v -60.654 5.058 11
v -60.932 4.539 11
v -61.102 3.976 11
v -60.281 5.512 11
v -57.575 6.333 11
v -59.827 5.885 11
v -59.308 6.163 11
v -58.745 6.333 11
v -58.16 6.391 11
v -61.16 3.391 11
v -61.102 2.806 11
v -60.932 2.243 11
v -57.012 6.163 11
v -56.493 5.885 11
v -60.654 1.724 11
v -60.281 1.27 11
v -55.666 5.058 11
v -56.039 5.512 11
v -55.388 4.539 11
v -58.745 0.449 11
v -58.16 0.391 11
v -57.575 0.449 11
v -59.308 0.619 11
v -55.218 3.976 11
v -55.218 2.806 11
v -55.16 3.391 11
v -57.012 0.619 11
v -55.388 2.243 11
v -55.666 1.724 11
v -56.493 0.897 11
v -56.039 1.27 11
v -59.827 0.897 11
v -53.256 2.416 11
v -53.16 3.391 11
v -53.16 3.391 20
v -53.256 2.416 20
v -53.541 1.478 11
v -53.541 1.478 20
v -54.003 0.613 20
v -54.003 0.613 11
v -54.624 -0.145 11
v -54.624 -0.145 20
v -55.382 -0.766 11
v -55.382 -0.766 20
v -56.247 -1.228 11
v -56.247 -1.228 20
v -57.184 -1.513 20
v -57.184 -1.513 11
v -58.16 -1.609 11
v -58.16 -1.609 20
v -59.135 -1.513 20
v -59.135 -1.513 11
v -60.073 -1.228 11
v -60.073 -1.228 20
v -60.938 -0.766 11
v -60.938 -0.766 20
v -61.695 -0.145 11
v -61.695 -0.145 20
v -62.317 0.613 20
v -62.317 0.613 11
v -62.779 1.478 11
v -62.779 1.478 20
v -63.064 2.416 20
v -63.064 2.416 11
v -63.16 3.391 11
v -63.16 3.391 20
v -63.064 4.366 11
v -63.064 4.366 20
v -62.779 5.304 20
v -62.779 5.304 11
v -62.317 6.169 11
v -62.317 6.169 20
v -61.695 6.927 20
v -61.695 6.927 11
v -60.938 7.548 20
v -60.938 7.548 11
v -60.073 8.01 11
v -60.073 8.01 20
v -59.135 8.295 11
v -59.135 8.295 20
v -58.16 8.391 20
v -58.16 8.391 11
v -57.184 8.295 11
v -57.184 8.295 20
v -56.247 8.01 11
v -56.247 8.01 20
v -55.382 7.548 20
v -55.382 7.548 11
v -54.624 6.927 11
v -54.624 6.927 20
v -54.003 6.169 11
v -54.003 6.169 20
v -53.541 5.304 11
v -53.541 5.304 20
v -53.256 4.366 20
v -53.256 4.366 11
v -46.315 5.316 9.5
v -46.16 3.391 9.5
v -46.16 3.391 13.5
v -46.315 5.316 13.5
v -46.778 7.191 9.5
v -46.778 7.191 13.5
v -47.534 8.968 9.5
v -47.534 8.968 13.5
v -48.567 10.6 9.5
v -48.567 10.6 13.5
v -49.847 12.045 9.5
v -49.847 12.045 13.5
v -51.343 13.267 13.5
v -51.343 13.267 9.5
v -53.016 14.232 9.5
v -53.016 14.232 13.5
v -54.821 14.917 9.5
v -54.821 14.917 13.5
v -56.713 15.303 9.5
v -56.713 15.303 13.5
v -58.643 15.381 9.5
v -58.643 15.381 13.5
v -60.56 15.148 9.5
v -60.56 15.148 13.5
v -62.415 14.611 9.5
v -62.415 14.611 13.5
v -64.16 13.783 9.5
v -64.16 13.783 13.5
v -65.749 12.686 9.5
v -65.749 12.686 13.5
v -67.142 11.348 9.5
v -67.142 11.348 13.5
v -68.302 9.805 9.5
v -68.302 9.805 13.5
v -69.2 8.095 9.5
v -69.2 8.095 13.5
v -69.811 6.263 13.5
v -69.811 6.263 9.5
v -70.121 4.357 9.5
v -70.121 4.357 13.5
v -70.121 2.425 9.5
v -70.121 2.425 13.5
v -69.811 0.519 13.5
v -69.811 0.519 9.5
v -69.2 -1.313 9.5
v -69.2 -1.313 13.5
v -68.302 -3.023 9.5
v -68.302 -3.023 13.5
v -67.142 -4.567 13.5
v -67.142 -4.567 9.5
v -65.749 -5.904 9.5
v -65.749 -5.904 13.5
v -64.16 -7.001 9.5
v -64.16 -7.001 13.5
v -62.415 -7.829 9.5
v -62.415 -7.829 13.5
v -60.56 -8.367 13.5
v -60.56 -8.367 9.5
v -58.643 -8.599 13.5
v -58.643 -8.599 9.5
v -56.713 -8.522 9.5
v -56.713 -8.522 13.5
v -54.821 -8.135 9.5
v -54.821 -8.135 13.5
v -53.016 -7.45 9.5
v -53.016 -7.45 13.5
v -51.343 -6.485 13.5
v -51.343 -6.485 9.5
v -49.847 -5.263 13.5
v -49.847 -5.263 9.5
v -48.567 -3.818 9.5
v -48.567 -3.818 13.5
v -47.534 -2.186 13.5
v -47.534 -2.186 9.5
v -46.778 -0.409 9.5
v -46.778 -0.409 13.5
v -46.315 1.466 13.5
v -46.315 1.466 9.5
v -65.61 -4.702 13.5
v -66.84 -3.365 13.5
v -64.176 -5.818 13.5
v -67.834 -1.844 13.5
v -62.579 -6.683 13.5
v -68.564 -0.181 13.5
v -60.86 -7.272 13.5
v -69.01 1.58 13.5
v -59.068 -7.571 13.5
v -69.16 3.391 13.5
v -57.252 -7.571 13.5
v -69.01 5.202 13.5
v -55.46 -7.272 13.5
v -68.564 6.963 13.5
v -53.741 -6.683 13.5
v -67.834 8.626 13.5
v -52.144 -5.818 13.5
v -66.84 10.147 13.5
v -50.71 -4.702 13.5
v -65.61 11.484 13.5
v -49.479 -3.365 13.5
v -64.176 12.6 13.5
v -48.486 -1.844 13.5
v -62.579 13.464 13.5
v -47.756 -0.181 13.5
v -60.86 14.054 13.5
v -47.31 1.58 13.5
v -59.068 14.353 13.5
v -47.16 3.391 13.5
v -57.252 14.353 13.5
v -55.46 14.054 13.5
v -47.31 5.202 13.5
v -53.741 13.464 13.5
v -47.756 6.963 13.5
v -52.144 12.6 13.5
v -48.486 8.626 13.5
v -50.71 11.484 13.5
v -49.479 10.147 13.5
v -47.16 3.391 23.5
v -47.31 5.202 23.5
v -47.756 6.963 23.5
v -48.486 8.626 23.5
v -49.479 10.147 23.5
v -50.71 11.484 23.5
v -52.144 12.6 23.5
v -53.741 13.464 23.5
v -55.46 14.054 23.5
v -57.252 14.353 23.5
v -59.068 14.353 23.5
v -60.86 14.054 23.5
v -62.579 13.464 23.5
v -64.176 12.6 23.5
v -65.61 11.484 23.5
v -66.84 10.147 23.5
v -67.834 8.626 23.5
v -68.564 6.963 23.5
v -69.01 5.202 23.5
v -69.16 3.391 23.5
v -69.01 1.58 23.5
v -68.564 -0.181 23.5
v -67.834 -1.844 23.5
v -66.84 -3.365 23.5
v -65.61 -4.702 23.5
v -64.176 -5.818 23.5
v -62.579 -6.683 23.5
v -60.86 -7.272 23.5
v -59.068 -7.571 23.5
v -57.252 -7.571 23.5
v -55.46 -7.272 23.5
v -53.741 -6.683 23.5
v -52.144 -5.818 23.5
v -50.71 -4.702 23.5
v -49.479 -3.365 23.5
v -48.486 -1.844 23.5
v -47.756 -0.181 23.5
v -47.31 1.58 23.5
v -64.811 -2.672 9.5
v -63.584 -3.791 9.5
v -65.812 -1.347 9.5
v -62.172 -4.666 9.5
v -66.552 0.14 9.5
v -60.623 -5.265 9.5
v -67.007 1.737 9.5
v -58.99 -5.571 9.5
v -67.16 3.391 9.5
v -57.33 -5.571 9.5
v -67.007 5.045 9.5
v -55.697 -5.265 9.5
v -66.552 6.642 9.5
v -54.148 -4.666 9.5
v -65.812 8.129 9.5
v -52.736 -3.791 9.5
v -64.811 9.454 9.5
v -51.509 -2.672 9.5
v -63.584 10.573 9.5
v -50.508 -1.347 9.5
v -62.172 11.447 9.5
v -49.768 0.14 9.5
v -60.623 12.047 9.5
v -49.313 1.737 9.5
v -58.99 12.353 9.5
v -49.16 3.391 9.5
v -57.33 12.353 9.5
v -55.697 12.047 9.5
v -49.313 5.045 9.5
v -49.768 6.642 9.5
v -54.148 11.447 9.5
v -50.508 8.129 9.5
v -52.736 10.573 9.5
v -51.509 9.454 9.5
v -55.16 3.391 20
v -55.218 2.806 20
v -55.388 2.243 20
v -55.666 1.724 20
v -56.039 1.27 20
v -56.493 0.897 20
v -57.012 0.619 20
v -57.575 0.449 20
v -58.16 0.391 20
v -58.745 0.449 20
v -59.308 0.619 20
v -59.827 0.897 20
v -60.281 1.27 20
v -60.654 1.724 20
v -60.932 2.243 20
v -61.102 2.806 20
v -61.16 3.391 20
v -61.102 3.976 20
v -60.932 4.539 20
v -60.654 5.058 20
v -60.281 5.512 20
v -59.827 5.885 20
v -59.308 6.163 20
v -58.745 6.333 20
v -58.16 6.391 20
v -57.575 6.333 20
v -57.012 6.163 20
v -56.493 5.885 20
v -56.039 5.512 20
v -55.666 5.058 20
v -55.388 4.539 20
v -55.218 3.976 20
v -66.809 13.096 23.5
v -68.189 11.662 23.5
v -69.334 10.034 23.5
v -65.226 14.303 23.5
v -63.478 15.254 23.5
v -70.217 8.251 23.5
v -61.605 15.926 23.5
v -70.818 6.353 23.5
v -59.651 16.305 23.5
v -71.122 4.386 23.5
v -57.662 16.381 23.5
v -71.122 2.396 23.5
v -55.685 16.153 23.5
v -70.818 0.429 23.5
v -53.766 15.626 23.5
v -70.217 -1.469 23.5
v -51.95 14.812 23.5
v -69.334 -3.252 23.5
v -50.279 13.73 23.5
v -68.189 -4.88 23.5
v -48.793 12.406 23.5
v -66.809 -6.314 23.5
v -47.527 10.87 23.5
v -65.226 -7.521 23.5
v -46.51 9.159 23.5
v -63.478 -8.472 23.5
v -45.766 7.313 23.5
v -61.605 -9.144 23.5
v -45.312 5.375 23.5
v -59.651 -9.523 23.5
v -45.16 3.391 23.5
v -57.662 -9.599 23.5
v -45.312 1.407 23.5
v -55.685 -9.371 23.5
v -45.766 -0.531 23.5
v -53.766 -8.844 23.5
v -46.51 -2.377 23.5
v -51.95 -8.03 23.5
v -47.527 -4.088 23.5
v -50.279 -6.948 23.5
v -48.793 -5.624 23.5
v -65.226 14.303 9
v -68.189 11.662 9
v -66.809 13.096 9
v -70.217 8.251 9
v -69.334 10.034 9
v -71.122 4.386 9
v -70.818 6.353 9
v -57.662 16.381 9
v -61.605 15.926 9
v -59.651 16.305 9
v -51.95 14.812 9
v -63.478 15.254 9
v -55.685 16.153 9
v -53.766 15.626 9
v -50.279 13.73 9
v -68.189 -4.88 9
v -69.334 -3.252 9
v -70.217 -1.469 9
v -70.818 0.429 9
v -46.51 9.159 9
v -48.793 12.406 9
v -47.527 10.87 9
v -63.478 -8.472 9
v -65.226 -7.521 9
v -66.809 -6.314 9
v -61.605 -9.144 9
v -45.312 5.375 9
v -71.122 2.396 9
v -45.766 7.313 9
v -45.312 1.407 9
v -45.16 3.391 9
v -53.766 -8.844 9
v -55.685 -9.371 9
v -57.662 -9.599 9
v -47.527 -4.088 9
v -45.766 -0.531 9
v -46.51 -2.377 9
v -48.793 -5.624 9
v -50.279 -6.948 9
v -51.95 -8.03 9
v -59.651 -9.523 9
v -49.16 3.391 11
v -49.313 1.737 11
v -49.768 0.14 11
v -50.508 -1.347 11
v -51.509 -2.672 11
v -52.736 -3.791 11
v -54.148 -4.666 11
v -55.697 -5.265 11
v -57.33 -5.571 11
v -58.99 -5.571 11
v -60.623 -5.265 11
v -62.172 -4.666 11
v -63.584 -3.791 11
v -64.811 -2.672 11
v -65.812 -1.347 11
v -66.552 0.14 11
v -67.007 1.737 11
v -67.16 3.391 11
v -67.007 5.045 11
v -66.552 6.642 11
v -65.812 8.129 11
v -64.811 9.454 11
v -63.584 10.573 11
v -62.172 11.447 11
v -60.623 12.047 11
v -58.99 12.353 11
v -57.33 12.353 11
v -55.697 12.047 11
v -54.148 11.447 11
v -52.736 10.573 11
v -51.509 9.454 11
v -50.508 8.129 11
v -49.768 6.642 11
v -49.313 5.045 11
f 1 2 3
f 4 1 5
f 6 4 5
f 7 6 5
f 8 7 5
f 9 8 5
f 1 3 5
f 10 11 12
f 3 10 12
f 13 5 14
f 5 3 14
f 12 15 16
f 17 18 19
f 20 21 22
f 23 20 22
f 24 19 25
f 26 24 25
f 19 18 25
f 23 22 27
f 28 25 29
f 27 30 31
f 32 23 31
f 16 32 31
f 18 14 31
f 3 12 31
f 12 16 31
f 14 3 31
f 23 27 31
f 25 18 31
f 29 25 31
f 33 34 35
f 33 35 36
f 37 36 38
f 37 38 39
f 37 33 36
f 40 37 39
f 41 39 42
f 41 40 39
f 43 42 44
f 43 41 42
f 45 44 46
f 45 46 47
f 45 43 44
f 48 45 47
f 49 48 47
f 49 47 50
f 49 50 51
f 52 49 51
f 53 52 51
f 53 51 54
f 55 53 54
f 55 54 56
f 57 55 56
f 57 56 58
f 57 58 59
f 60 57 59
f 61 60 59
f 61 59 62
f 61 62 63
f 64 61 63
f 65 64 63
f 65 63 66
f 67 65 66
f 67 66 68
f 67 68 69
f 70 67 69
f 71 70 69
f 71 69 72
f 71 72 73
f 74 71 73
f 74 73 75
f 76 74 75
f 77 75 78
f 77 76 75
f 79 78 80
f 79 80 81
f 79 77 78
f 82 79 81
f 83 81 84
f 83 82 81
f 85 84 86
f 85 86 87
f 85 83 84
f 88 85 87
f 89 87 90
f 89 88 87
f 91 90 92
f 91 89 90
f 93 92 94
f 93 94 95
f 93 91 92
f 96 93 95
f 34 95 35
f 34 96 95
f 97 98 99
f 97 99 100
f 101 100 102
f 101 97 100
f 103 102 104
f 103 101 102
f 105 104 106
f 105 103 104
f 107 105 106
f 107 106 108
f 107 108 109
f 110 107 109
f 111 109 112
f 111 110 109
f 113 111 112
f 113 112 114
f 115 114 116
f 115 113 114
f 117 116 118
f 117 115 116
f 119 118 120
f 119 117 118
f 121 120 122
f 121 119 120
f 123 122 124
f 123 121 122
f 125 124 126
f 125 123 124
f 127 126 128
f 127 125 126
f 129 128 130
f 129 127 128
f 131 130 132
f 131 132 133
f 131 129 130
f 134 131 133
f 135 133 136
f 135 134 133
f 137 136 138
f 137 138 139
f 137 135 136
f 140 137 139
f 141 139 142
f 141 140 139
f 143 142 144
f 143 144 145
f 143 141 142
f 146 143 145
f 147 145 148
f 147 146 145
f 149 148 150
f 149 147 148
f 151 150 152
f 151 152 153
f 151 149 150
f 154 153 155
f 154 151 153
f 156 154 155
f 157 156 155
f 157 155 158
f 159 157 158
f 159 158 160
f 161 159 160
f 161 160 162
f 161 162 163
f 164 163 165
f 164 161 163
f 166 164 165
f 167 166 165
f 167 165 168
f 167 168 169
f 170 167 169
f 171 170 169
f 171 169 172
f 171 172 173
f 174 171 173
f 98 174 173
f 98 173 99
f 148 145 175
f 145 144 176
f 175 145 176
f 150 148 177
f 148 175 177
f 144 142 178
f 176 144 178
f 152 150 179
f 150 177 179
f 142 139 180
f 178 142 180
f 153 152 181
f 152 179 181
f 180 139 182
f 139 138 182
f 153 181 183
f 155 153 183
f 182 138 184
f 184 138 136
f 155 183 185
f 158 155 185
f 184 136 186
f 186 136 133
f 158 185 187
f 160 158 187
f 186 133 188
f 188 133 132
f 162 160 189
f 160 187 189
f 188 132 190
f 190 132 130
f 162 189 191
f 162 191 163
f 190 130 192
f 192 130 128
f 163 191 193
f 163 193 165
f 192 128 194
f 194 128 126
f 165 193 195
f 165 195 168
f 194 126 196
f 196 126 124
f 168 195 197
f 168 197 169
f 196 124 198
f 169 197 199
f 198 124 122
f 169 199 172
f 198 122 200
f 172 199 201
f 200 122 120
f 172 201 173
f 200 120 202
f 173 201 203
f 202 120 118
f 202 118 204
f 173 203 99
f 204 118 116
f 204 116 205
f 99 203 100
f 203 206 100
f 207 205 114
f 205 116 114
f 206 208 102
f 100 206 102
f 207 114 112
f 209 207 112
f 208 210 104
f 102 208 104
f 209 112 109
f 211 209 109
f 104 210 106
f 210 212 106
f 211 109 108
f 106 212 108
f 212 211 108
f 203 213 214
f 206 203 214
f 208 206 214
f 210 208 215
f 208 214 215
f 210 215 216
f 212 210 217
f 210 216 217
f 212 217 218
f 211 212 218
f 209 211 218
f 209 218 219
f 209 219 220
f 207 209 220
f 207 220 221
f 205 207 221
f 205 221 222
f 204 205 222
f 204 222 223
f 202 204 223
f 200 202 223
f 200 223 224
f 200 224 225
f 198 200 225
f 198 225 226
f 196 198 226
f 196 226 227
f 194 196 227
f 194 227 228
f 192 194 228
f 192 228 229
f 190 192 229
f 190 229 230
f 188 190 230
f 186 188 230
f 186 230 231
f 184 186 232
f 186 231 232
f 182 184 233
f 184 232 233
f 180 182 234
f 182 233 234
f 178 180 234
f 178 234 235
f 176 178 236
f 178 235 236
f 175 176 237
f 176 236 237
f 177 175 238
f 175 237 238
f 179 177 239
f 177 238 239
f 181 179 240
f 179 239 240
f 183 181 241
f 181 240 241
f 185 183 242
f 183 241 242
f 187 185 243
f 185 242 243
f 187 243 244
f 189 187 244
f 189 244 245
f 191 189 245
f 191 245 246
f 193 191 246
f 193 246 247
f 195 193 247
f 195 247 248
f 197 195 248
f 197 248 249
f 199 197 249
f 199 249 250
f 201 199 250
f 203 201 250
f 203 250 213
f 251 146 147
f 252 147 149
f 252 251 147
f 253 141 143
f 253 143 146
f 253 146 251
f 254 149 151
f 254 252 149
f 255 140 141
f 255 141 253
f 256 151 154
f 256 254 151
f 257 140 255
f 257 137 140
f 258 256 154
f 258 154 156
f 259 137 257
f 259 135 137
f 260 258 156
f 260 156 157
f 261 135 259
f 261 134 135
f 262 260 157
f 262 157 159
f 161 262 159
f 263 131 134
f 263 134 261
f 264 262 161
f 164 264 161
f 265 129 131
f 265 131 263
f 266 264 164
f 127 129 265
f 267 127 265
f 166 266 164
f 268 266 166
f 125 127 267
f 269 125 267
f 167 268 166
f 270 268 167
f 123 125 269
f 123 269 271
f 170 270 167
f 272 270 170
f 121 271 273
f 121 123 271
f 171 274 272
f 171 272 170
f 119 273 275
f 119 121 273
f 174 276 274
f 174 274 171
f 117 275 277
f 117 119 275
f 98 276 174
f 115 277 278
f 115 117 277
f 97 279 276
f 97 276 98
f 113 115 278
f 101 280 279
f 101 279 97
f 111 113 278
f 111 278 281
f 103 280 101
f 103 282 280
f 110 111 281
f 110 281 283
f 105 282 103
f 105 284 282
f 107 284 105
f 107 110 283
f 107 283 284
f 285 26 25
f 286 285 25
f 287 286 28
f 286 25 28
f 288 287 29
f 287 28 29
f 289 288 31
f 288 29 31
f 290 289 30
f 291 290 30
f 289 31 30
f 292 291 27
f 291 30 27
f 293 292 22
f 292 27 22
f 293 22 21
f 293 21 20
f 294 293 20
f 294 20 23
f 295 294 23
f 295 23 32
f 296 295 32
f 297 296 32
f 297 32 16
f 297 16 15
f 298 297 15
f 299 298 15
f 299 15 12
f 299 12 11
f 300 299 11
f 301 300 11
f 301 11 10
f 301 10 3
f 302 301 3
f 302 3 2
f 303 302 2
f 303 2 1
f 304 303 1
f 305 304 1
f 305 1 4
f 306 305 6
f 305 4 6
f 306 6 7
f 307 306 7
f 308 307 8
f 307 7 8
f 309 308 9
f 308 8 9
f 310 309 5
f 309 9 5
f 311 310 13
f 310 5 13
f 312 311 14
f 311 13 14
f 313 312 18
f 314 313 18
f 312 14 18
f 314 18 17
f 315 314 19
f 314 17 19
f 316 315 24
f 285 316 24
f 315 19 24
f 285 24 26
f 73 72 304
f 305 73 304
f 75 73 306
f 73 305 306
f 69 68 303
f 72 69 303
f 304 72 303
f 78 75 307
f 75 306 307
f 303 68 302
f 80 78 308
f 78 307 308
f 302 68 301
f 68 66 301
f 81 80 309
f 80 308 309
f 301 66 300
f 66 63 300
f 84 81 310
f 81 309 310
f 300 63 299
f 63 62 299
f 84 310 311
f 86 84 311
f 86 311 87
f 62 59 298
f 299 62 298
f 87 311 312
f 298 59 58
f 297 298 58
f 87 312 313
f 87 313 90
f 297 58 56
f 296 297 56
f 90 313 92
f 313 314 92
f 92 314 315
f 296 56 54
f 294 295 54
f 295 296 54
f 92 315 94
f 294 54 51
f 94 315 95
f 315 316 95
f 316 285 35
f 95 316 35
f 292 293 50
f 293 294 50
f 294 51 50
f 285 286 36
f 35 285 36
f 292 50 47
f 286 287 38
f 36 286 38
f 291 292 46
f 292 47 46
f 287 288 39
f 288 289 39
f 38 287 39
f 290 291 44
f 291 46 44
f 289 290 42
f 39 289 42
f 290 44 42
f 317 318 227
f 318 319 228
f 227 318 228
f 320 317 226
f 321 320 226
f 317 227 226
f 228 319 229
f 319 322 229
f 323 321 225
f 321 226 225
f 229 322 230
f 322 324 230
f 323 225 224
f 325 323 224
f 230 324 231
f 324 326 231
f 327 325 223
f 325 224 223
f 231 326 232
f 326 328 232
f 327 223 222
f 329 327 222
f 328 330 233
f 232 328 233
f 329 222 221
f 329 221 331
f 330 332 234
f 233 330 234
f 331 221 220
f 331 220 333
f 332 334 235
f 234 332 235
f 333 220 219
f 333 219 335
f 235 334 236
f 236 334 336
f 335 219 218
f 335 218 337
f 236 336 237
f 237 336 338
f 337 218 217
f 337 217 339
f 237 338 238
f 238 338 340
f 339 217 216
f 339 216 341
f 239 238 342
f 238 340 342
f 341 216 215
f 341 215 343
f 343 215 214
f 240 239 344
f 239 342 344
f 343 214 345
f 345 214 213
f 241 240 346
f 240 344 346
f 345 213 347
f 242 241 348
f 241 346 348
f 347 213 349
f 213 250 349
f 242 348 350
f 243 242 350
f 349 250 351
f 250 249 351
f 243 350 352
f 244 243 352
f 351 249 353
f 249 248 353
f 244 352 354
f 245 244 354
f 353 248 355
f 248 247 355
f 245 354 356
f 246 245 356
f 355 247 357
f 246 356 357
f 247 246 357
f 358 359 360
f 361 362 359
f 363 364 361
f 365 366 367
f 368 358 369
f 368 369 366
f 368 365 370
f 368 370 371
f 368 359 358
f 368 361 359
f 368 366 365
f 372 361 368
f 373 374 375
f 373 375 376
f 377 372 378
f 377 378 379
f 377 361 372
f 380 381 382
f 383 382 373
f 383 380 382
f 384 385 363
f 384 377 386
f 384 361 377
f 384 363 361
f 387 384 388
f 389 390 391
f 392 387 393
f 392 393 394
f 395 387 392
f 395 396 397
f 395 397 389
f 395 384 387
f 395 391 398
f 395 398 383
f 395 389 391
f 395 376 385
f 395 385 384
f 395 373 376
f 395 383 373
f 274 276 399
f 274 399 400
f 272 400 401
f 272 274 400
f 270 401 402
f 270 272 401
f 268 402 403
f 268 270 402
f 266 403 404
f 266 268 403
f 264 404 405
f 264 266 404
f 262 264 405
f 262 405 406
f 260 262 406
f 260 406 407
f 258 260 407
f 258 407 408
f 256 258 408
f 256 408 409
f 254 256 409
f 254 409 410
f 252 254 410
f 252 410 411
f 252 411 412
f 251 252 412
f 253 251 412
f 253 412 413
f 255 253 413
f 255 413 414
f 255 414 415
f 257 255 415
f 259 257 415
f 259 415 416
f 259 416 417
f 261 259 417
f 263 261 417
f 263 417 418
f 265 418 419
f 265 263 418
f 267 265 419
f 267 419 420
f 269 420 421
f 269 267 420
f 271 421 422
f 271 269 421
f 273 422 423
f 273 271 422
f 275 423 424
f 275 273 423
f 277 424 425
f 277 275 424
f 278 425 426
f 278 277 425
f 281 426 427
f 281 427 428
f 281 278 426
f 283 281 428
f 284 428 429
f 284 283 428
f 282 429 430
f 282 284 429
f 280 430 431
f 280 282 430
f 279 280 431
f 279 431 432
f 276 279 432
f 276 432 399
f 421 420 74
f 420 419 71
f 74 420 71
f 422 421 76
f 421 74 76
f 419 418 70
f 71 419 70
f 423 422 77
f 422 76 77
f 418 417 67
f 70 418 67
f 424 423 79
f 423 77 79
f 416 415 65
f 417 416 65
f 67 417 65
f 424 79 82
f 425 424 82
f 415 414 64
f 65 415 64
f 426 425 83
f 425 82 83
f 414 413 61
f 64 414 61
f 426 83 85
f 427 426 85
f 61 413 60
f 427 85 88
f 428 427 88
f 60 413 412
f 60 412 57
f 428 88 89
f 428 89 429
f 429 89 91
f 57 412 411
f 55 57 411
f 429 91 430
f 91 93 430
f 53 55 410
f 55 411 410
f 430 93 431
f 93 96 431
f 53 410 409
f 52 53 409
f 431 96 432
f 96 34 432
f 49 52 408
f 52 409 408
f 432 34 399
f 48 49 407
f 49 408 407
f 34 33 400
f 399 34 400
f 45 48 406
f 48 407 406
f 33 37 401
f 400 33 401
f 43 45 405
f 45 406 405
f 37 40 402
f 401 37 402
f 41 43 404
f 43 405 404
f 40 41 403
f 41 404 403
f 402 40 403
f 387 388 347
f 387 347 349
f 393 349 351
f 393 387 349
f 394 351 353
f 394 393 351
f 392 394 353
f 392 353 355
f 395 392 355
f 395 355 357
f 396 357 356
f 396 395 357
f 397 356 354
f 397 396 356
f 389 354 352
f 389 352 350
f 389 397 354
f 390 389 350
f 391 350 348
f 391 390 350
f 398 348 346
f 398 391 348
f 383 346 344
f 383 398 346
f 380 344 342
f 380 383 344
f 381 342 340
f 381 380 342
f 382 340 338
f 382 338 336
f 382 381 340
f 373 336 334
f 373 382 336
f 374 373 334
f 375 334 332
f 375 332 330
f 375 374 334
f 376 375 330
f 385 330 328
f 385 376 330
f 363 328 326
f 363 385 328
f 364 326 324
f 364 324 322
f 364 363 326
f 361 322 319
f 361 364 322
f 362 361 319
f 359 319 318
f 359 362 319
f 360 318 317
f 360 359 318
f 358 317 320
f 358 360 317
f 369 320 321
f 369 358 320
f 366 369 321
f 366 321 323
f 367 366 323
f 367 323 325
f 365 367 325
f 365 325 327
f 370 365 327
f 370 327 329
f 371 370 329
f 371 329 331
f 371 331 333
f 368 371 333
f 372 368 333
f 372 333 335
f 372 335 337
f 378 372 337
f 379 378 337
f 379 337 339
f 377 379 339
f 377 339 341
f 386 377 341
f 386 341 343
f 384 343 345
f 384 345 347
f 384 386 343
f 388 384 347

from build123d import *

# Parameters (mm, degrees)
CIRCLE070_R        = 12
EXTRUSION013_DEPTH = 4
CIRCLE066_R        = 11
EXTRUSION012_DEPTH = 14
CIRCLE_R           = 13
EXTRUSION_DEPTH    = 14.5
CIRCLE069_R        = 9
EXTRUDE072_DEPTH   = 2
CIRCLE067_R        = 3
EXTRUDE_DEPTH      = 11
CIRCLE068_R        = 5
EXTRUDE071_DEPTH   = 11


with BuildPart() as extrusion013:
    # Circle070 → Extrusion013 (new body)
    with BuildSketch(Plane(origin=(-85.118271, -1.008042, 9), x_dir=(1, 0, 0), z_dir=(0, 0, 1))):
        Circle(CIRCLE070_R)
    extrude(amount=EXTRUSION013_DEPTH)


with BuildPart() as extrusion013_1:
    # Extrusion013 placement: moved
    add(extrusion013.part.moved(Location((26.958331, 4.39901, 0.5))))


with BuildPart() as extrusion012:
    # Circle066 → Extrusion012 (new body)
    with BuildSketch(Plane(origin=(17.627983, 9.639136, 13.765504), x_dir=(1, 0, 0), z_dir=(0, 0, 1))):
        Circle(CIRCLE066_R)
    extrude(amount=-EXTRUSION012_DEPTH)


with BuildPart() as cut048:
    # Circle → Extrusion (new body)
    with BuildSketch(Plane(origin=(17.627983, 9.639136, -0.734496), x_dir=(1, 0, 0), z_dir=(0, 0, -1))):
        Circle(CIRCLE_R)
    extrude(amount=-EXTRUSION_DEPTH)

    # Cut: cut Extrusion012
    add(extrusion012.part, mode=Mode.SUBTRACT)


with BuildPart() as cut048_1:
    # Cut placement: moved
    add(cut048.part.moved(Location((-75.787923, -6.248169, 9.734496))))

    # Cut048: cut Extrusion013
    add(extrusion013_1.part, mode=Mode.SUBTRACT)


with BuildPart() as extrude072:
    # Circle069 → Extrude072 (new body)
    with BuildSketch(Plane(origin=(-58.15994, 3.390968, 9), x_dir=(1, 0, 0), z_dir=(0, 0, -1))):
        Circle(CIRCLE069_R)
    extrude(amount=-EXTRUDE072_DEPTH)


with BuildPart() as extrude_body:
    # Circle067 → Extrude (new body)
    with BuildSketch(Plane(origin=(-58.15994, 3.390968, 9), x_dir=(1, 0, 0), z_dir=(0, 0, -1))):
        Circle(CIRCLE067_R)
    extrude(amount=-EXTRUDE_DEPTH)


with BuildPart() as fusion001:
    # Circle068 → Extrude071 (new body)
    with BuildSketch(Plane(origin=(-58.15994, 3.390968, 9), x_dir=(1, 0, 0), z_dir=(0, 0, -1))):
        Circle(CIRCLE068_R)
    extrude(amount=-EXTRUDE071_DEPTH)

    # Cut047: cut Extrude body
    add(extrude_body.part, mode=Mode.SUBTRACT)

    # Fusion: union Extrude072
    add(extrude072.part)

    # Fusion001: union Cut048
    add(cut048_1.part)


solid = fusion001.part
